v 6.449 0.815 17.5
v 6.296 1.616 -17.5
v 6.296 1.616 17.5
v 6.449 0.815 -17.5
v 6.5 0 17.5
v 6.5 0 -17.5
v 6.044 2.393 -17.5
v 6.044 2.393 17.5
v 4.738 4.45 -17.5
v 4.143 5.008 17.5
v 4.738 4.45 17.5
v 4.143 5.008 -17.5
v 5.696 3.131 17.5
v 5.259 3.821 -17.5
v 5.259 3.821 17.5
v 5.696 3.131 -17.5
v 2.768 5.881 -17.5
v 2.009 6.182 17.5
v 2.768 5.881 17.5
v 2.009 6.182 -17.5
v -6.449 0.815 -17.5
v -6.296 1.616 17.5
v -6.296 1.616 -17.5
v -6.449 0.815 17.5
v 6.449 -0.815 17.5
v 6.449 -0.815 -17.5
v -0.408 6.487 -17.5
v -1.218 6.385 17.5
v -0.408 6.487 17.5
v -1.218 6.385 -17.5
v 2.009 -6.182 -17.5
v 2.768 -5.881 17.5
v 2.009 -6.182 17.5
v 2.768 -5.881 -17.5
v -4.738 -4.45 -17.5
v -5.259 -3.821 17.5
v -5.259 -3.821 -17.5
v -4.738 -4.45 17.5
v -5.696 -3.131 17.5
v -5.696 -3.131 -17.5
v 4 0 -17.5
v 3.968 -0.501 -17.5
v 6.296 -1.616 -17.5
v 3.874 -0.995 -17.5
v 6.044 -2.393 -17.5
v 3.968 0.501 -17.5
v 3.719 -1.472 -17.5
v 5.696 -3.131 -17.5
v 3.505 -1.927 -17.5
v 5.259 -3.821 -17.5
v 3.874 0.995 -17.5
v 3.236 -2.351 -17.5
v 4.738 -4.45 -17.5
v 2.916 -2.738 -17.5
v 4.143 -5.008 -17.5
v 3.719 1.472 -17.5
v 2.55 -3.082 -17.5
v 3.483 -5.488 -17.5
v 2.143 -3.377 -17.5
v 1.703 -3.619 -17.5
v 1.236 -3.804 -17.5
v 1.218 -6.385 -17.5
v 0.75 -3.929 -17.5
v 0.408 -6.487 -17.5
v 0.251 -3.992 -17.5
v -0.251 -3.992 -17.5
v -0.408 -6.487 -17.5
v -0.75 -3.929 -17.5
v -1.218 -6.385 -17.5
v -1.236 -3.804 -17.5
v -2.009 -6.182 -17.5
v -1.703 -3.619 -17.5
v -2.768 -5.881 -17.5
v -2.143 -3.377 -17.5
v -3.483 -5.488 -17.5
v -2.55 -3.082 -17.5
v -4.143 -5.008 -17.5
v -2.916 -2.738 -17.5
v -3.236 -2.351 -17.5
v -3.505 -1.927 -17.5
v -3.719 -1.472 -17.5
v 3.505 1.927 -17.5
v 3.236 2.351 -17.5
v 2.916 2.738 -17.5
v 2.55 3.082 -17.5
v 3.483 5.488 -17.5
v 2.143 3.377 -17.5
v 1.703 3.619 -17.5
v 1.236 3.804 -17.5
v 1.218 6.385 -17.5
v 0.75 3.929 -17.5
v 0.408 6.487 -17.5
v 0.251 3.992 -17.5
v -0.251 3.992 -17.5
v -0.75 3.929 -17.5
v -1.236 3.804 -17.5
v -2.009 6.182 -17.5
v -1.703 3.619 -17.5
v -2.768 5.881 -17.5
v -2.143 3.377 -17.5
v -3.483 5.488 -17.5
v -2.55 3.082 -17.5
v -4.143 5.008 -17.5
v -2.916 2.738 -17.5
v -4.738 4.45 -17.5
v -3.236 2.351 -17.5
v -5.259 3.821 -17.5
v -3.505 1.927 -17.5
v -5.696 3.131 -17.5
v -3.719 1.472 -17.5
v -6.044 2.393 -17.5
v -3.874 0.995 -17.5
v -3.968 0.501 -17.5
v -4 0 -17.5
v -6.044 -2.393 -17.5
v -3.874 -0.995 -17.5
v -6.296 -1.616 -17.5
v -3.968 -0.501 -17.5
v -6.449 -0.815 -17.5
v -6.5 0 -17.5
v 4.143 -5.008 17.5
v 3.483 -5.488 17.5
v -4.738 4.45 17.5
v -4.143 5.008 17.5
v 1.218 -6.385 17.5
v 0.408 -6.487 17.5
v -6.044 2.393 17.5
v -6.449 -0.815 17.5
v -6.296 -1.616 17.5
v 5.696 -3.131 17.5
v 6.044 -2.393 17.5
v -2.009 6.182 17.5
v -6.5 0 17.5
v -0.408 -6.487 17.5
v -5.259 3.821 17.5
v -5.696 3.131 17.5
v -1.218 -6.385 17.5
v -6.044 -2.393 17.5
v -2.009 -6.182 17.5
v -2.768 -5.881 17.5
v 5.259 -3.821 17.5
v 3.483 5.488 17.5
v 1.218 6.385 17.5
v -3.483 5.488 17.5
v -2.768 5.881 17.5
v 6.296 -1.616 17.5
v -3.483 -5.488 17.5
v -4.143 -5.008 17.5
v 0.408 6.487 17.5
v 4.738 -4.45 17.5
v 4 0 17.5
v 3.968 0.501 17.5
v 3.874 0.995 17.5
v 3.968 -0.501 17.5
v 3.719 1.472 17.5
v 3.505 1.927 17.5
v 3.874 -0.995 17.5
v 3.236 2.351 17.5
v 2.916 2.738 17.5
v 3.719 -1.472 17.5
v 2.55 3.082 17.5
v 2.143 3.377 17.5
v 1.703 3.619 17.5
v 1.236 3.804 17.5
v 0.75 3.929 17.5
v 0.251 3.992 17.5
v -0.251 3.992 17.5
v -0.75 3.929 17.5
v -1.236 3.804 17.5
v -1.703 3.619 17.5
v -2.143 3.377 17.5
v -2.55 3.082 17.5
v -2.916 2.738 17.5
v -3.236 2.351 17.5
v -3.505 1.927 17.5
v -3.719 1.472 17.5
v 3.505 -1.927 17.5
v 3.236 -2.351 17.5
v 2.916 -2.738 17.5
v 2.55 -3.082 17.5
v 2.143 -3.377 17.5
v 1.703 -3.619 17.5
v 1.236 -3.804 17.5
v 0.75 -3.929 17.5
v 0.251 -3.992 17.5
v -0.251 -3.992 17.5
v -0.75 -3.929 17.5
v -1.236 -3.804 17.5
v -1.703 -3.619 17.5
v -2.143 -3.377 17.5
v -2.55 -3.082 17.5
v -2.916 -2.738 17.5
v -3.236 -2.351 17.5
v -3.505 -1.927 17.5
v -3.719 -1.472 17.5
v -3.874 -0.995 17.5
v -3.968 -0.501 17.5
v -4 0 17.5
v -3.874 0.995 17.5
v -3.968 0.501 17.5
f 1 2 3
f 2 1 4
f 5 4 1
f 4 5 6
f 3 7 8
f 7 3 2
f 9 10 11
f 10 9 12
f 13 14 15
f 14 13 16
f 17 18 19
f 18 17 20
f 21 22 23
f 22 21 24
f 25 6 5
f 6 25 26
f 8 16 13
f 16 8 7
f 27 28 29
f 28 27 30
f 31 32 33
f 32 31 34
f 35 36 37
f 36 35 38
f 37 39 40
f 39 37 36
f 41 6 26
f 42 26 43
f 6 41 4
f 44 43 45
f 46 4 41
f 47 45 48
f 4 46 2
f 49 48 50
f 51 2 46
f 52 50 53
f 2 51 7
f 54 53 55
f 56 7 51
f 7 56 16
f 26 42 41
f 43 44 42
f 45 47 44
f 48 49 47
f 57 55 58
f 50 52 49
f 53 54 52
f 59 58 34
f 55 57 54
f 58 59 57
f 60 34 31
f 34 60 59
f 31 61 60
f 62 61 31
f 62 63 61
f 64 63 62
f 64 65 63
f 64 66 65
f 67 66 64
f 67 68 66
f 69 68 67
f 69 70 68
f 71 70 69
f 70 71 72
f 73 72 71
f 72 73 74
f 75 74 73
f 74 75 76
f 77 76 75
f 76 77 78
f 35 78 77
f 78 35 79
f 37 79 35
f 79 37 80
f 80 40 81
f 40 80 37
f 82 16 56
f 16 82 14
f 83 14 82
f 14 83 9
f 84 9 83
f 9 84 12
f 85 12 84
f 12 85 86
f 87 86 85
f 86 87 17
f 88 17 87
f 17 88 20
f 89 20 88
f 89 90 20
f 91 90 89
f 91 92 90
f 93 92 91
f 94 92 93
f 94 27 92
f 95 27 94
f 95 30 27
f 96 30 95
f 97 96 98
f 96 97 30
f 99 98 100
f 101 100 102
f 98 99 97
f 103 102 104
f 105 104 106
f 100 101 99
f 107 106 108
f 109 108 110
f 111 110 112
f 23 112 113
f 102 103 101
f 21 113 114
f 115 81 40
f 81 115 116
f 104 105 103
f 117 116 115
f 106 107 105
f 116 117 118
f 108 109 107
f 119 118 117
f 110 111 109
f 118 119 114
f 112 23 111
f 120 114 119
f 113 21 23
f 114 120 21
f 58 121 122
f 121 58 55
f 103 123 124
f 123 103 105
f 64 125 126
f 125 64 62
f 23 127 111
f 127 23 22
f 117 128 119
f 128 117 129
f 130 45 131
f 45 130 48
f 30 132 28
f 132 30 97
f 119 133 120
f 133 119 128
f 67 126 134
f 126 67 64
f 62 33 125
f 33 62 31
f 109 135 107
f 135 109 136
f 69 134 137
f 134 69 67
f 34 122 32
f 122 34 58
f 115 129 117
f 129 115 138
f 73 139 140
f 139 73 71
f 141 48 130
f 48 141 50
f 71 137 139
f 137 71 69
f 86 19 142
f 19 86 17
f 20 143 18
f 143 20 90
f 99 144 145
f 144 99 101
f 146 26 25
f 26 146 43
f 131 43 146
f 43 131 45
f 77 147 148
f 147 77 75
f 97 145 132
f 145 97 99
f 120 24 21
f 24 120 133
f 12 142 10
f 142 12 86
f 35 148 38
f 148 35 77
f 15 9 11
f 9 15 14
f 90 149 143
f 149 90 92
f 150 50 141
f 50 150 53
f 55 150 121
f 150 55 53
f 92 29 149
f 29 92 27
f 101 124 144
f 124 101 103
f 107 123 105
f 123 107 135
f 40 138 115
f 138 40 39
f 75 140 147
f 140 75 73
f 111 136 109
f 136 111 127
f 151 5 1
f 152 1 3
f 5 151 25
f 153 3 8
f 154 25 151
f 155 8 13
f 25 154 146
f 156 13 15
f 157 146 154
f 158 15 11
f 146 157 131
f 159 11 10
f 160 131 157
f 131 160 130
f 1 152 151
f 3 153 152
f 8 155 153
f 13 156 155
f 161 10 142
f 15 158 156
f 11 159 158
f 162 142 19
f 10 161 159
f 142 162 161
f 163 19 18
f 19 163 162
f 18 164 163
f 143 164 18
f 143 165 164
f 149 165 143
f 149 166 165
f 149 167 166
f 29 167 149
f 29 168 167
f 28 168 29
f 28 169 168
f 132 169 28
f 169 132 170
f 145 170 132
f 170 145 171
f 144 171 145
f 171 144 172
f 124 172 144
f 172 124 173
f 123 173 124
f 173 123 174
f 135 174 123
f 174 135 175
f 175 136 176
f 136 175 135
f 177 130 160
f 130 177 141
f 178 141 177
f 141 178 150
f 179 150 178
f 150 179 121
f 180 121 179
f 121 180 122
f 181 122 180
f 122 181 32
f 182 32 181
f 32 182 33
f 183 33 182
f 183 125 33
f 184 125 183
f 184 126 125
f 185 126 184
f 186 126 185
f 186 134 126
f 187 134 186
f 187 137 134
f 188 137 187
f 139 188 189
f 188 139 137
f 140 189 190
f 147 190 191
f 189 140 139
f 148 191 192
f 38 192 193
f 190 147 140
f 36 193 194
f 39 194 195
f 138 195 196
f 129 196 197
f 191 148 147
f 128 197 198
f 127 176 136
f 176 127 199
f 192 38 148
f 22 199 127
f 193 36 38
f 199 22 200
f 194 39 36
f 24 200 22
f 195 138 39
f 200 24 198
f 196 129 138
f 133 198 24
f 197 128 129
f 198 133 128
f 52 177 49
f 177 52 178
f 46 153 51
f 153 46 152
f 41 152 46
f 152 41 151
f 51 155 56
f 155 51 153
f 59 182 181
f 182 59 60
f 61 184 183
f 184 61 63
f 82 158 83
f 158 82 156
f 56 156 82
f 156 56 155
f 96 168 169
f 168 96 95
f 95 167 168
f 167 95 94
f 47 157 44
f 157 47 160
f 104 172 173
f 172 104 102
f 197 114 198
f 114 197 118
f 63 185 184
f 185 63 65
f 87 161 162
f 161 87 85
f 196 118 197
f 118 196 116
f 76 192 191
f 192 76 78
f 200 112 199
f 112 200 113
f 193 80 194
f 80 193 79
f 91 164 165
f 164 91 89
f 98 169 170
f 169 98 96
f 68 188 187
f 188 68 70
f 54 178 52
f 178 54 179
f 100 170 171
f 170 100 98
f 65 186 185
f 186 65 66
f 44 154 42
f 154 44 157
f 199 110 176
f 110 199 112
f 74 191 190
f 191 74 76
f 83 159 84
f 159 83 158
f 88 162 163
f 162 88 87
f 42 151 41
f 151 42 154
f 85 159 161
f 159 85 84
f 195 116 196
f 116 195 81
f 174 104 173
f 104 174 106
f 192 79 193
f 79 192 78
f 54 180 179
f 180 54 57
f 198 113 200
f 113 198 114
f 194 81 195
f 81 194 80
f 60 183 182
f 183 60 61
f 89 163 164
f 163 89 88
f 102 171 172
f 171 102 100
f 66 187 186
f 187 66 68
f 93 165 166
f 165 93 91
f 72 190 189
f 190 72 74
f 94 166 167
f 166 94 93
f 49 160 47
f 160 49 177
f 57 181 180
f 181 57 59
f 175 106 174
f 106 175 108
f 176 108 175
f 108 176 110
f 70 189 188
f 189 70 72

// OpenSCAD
$fn = 50;


difference() {
	union() {
		translate(v = [0, 0, -17.5000000000]) {
			cylinder(h = 35, r = 6.5000000000);
		}
	}
	union() {
		translate(v = [0, 0, -100.0000000000]) {
			cylinder(h = 200, r = 4.0000000000);
		}
	}
}
